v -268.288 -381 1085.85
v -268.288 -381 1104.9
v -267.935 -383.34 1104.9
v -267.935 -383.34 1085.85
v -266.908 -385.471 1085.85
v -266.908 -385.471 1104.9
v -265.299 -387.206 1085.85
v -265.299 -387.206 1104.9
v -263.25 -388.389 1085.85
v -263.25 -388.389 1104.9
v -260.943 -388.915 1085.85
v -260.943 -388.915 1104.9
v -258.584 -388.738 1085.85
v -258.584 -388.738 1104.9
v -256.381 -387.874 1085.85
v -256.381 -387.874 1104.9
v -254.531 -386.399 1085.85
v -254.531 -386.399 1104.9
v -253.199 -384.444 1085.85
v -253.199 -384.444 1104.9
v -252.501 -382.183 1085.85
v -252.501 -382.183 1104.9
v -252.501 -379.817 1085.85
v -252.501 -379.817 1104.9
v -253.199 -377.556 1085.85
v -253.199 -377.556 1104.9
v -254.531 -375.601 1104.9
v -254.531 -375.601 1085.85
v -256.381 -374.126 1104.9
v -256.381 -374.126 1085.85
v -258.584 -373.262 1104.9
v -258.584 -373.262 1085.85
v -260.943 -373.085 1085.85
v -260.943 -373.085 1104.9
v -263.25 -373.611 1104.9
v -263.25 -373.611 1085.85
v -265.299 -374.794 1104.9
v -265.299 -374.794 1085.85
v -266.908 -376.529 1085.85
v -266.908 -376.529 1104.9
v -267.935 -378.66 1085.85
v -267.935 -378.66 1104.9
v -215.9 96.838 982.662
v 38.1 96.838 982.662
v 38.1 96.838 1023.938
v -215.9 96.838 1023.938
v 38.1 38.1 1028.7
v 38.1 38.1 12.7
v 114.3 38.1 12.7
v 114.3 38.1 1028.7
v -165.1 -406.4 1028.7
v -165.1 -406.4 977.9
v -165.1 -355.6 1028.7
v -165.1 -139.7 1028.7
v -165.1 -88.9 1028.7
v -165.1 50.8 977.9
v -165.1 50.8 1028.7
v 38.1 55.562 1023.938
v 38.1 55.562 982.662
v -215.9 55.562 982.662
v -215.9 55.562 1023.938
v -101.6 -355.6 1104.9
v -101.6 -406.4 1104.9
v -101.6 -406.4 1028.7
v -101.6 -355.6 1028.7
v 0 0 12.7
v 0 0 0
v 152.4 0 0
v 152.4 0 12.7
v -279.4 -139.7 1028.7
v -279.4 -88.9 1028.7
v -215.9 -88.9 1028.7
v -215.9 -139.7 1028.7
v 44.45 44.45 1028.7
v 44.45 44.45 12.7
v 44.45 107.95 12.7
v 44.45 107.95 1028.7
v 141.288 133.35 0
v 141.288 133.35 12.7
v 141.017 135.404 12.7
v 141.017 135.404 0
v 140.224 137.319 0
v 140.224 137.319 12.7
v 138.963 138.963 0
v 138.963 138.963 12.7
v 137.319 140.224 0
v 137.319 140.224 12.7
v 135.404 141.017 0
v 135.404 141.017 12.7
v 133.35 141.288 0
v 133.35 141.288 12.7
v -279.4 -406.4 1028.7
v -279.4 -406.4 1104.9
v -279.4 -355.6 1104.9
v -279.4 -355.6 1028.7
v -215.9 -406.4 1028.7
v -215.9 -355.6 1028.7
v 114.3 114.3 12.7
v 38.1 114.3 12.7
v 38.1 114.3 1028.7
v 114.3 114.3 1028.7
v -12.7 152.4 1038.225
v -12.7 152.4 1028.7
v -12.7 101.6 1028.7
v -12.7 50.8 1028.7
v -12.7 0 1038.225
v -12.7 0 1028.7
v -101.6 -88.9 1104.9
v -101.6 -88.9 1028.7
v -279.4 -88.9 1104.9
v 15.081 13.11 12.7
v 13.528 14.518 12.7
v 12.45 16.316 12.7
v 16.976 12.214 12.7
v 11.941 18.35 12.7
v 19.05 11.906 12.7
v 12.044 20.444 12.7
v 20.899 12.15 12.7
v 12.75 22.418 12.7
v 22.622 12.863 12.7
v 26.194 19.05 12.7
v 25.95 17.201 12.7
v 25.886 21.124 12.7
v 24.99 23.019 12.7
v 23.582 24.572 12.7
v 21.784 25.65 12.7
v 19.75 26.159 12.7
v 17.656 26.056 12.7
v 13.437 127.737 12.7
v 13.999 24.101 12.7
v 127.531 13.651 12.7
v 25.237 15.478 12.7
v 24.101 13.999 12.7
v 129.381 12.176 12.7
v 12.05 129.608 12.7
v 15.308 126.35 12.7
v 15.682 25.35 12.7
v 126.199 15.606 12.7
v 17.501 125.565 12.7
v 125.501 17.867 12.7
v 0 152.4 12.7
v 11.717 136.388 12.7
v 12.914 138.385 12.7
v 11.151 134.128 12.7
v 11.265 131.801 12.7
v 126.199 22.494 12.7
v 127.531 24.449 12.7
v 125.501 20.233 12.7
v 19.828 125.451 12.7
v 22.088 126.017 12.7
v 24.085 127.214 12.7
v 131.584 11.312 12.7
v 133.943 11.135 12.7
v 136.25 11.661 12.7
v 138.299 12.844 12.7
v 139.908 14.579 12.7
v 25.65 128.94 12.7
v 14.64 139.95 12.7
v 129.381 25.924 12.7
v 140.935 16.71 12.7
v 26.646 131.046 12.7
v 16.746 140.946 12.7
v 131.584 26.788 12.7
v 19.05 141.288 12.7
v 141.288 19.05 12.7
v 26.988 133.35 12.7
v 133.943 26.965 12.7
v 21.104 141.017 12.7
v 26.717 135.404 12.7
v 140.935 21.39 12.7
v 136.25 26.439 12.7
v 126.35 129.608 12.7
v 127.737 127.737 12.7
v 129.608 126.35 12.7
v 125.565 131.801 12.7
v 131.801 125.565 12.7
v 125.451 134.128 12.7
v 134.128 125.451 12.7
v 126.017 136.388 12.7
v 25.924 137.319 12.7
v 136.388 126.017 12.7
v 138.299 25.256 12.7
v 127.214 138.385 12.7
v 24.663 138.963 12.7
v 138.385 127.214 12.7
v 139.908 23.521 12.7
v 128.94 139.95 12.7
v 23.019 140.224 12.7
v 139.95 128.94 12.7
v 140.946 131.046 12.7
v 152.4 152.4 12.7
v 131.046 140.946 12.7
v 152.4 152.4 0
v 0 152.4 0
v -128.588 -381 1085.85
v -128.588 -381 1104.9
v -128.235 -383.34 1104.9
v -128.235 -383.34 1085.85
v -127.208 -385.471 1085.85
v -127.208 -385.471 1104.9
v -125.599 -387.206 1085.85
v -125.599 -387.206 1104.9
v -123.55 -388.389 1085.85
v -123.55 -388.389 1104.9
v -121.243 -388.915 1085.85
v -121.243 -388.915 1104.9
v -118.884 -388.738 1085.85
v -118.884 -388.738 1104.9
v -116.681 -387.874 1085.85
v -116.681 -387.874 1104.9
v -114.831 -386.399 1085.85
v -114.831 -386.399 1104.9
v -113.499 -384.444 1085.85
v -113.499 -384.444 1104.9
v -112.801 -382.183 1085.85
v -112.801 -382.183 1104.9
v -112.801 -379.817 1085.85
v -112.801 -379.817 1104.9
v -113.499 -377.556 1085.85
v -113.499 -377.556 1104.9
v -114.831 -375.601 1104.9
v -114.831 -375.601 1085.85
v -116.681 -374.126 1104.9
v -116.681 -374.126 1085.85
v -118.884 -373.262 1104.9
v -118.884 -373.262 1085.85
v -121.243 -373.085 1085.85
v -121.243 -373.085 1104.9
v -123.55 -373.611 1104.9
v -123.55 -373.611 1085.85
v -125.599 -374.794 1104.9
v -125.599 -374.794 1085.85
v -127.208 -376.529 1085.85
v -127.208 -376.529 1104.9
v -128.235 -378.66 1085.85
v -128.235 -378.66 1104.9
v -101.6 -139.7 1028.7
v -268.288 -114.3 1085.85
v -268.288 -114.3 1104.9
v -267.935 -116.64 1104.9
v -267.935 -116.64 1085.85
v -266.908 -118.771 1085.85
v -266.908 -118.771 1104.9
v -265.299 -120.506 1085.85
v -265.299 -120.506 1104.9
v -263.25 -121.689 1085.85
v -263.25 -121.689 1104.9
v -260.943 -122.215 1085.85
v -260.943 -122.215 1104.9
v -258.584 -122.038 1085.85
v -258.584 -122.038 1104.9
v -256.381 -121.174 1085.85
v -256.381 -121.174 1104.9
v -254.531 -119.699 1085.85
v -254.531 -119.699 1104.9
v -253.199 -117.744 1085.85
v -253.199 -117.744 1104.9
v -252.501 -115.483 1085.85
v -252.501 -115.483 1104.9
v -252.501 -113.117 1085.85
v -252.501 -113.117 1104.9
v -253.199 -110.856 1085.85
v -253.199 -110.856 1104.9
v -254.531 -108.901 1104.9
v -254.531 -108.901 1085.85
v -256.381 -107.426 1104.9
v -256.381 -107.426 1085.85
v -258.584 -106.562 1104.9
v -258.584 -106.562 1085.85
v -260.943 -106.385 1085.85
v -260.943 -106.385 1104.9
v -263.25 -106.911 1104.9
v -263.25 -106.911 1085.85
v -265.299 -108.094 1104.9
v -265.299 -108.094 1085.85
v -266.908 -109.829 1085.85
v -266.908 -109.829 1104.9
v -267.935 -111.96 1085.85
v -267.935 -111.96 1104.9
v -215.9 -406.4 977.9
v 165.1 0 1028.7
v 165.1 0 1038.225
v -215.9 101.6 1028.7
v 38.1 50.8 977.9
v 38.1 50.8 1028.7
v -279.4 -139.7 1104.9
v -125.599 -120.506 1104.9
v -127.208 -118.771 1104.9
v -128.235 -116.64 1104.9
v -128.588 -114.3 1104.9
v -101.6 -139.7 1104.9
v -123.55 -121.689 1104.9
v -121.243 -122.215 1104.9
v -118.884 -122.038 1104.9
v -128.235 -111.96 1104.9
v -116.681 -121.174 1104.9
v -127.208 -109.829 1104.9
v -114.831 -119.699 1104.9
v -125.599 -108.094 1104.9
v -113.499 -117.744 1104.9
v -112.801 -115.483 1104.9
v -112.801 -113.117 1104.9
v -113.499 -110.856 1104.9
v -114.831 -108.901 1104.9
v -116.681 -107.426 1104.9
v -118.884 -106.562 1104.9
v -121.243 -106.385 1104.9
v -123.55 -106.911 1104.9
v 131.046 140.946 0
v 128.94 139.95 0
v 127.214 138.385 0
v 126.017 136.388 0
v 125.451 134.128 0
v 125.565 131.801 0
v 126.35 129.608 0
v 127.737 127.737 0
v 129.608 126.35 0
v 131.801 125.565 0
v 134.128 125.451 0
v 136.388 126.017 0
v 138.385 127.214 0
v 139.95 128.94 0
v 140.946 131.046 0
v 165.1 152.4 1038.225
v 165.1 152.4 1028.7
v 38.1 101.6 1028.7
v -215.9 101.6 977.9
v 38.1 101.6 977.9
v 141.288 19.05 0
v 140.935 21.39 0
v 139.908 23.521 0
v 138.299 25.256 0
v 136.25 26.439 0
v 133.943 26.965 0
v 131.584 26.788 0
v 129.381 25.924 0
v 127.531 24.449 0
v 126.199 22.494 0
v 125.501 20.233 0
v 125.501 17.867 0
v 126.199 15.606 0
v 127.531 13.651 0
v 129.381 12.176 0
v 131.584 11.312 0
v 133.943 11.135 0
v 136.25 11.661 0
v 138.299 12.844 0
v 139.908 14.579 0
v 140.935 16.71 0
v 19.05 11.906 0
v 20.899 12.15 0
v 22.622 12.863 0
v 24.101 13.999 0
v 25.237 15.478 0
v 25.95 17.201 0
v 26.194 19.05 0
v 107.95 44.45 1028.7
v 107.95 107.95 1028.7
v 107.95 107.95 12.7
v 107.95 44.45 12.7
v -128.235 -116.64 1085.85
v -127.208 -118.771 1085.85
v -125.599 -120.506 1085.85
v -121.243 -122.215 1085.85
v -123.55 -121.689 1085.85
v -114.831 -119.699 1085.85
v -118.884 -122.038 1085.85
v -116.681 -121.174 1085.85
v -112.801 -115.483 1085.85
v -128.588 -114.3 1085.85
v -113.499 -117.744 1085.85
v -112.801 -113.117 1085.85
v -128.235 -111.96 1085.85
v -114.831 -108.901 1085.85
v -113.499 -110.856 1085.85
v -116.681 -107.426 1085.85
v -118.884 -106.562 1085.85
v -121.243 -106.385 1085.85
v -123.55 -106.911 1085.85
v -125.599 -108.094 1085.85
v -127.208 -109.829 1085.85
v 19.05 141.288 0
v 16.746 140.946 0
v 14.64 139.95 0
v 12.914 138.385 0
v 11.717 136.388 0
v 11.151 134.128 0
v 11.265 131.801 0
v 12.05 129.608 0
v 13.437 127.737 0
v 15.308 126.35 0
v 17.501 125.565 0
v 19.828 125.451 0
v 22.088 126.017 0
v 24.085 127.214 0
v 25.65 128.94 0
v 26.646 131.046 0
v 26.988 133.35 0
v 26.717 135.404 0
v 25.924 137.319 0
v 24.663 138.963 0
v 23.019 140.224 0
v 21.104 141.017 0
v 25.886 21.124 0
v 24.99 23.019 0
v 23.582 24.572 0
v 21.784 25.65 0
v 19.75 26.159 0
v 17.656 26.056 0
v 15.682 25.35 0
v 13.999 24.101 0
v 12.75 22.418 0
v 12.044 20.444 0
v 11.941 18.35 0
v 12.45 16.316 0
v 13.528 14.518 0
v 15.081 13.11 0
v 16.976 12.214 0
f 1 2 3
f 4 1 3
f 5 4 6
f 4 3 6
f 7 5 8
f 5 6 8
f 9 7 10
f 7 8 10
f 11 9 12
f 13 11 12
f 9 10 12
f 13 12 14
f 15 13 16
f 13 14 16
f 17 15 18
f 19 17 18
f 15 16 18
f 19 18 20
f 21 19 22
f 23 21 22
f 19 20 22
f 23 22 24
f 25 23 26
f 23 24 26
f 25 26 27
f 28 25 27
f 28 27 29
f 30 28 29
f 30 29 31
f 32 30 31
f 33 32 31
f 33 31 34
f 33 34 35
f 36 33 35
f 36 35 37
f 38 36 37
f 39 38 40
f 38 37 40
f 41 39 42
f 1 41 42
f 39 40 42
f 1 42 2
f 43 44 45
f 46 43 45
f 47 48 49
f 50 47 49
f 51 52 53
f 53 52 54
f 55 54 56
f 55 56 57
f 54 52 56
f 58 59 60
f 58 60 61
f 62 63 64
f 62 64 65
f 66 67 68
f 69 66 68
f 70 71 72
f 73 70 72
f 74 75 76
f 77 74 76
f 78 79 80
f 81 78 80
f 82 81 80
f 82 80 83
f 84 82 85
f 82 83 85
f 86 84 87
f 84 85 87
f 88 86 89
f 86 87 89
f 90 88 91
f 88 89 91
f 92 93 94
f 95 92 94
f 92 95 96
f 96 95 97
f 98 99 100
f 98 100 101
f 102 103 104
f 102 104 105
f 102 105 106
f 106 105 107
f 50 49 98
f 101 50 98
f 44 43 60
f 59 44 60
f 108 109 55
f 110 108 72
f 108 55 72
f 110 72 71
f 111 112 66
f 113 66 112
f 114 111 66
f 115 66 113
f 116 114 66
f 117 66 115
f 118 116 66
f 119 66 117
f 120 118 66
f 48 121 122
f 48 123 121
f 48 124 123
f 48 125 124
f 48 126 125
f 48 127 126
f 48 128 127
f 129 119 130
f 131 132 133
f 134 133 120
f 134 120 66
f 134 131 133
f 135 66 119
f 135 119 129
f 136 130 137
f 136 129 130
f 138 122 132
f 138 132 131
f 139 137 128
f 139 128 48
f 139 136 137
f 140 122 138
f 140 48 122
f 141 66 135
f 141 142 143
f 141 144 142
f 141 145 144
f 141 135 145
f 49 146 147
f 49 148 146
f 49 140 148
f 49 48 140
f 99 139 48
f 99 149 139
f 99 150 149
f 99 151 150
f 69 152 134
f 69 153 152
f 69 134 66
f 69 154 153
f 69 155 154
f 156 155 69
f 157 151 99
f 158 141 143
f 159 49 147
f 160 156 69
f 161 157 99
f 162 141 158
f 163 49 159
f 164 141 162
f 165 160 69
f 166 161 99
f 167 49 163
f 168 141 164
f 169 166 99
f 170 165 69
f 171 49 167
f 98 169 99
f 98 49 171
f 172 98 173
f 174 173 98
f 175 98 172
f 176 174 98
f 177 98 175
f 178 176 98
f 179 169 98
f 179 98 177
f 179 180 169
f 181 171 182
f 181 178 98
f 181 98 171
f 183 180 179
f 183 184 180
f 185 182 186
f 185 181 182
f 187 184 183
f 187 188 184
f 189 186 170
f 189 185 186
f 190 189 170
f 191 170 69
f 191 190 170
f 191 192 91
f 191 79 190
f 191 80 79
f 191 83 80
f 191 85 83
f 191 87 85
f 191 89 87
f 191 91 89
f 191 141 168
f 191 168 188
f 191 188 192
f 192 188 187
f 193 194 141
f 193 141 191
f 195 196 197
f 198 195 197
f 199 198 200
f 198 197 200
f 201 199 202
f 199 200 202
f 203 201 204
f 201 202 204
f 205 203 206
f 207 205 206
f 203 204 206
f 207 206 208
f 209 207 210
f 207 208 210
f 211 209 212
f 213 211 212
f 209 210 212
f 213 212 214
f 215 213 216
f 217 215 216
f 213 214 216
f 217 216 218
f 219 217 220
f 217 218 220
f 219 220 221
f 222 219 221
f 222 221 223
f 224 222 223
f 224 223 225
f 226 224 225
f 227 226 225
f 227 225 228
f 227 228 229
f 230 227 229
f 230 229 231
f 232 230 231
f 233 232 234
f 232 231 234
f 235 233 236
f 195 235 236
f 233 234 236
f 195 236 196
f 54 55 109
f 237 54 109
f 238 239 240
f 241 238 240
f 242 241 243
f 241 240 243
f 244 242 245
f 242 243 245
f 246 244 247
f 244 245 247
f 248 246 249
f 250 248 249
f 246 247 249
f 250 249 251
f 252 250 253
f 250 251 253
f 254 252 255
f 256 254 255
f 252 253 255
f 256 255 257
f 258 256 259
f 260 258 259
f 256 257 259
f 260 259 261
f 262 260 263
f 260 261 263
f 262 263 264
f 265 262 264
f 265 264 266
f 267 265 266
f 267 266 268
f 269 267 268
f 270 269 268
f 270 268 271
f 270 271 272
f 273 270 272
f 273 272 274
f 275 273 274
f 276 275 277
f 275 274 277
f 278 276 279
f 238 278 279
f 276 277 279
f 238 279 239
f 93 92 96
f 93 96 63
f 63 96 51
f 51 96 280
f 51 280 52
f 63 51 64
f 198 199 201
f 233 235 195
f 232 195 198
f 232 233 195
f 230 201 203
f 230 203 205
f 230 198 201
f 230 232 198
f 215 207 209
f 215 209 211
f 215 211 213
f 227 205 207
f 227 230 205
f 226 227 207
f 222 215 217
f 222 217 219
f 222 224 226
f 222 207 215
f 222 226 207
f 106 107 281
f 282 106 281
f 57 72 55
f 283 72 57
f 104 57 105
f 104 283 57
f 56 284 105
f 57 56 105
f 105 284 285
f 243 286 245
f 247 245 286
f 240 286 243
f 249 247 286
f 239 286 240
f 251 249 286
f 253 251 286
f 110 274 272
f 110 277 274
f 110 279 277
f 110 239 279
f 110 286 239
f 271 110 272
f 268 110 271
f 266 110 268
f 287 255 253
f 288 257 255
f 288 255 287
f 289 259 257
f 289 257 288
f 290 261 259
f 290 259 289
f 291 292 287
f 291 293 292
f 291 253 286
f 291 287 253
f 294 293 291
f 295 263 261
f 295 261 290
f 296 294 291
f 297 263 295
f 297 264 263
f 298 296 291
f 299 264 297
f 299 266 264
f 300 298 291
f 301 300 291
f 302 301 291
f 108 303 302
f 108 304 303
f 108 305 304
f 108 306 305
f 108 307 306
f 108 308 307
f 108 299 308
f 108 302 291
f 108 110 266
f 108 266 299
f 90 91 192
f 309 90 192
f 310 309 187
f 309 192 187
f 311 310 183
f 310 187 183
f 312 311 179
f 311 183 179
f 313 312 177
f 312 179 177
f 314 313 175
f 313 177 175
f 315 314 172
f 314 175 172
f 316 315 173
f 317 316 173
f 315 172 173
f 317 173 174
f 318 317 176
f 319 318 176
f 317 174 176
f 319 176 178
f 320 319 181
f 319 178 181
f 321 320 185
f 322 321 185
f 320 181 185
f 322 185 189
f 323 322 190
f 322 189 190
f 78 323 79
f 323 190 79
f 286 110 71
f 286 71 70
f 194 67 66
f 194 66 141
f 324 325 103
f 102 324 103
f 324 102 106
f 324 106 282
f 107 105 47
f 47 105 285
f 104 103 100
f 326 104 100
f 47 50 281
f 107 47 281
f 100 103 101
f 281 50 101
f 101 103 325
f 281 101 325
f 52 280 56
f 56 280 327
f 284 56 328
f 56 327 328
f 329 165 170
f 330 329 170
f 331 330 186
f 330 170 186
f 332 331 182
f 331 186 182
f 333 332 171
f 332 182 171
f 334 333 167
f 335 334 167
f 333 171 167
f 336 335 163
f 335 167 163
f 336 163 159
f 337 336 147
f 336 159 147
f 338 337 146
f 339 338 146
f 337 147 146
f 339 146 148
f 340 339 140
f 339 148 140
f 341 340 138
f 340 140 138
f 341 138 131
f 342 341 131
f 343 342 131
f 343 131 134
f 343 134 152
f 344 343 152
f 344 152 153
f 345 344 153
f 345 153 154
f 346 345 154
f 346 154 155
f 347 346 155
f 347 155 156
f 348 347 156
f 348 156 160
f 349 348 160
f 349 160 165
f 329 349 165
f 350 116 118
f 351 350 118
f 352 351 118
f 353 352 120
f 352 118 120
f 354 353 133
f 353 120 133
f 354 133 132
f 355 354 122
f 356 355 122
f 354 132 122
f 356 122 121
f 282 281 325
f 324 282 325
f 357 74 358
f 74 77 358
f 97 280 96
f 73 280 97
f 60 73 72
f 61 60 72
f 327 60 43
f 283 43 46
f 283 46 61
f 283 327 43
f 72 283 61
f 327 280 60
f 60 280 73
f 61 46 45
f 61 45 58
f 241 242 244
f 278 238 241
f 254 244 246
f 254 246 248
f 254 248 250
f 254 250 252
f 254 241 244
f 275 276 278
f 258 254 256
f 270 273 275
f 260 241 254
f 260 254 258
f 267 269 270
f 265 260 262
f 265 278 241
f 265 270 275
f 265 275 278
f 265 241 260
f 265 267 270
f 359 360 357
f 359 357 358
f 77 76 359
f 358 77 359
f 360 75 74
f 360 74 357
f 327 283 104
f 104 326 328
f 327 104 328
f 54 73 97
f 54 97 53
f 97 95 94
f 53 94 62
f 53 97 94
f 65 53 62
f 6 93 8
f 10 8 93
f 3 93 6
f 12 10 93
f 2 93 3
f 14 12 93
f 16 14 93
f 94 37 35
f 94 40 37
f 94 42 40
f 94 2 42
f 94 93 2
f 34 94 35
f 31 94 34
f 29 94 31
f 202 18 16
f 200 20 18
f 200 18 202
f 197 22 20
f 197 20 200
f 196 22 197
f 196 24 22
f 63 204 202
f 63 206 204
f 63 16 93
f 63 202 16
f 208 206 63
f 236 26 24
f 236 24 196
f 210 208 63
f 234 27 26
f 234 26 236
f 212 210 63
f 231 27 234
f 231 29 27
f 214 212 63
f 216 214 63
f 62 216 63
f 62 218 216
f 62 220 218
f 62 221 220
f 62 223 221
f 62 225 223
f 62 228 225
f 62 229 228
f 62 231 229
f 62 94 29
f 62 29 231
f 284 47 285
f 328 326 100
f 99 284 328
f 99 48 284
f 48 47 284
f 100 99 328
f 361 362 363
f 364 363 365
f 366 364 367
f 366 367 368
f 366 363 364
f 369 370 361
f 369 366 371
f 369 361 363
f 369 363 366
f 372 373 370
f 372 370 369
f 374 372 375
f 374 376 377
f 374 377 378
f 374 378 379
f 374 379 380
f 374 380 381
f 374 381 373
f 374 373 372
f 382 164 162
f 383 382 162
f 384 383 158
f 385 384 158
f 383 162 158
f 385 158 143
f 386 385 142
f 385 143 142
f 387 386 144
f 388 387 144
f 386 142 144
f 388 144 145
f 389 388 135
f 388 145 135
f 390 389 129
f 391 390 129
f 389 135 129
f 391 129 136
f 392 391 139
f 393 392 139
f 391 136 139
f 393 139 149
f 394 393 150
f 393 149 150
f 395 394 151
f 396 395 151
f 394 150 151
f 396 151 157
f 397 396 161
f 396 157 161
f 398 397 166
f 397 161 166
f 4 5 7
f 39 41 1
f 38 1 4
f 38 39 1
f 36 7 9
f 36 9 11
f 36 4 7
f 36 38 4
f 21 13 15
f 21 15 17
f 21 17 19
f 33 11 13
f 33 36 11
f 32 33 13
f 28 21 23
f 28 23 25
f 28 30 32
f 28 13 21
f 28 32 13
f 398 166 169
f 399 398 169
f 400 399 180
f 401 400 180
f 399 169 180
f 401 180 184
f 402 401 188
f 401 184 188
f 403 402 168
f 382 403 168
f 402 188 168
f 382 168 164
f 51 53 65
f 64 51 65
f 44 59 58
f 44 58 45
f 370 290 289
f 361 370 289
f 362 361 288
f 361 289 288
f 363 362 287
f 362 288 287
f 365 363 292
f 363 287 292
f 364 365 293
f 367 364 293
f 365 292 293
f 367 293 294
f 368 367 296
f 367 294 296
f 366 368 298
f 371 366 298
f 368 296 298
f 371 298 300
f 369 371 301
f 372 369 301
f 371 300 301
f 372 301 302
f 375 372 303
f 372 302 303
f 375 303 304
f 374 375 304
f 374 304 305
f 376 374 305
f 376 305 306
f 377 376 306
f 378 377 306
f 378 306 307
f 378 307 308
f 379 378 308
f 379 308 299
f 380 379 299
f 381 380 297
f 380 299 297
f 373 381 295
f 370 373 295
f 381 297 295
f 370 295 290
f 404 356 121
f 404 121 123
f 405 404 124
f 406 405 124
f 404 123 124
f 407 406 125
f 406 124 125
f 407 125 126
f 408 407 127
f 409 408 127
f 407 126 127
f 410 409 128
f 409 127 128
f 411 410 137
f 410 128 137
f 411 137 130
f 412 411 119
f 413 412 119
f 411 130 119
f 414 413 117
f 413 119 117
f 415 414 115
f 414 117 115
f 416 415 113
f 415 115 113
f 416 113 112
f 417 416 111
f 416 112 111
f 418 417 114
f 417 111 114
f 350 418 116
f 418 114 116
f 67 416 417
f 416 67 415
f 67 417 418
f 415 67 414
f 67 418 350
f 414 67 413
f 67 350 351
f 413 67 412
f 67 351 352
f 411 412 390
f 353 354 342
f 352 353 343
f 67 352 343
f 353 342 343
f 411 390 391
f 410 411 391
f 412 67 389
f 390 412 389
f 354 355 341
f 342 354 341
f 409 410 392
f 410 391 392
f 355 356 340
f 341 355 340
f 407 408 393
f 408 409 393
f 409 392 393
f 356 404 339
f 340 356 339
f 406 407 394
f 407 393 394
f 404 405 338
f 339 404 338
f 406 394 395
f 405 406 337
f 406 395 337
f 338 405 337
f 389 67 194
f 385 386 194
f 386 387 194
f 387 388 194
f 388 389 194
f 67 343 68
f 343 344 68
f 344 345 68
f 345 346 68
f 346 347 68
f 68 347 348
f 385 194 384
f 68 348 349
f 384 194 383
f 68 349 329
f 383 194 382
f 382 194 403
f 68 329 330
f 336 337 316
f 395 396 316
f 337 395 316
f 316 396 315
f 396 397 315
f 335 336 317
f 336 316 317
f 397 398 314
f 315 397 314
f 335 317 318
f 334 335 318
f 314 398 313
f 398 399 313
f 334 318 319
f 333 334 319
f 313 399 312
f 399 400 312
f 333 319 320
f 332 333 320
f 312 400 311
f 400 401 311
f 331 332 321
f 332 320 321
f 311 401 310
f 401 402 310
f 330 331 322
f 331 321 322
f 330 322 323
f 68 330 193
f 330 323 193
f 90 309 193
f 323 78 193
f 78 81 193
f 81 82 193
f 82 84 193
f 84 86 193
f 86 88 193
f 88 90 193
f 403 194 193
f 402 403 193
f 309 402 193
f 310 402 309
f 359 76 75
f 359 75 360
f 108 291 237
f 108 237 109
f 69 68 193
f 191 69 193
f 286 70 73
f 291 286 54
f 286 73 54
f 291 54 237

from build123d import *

# Parameters (mm, degrees)
F0_W      = 152.4
F0_H      = 152.4
F1_DEPTH  = 12.7
F2_W      = 76.2
F2_H      = 76.2
F2_W_2    = 63.5
F2_H_2    = 63.5
F3_DEPTH  = 1016
F4_W      = 41.275
F4_H      = 41.275
F5_DEPTH  = 254
F6_W      = 50.8
F6_H      = 50.8
F7_DEPTH  = 457.2
F8_W      = 177.8
F8_H      = 50.8
F9_DEPTH  = 76.2
F11_DEPTH = 9.525
F13_DEPTH = 19.05
F15_DEPTH = 19.05
F16_R     = 7.9375
F17_DEPTH = 25.4


with BuildPart() as f1:
    # F0 (on Top) → F1 (new body)
    with BuildSketch(Plane.XY):
        with Locations((76.2, 76.2)):
            Rectangle(F0_W, F0_H)
    extrude(amount=F1_DEPTH)

    # F2 (on face) → F3 (join)
    with BuildSketch(Plane.XY.offset(12.7)):
        with Locations((76.2, 76.2)):
            Rectangle(F2_W, F2_H)
        with Locations((76.2, 76.2)):
            Rectangle(F2_W_2, F2_H_2, mode=Mode.SUBTRACT)
    extrude(amount=F3_DEPTH)

    # F4 (on face) → F5 (join)
    with BuildSketch(Plane(origin=(38.1, 0, 0), x_dir=(0, -1, 0), z_dir=(-1, 0, 0))):
        Polygon((-50.8, 1028.7), (-101.6, 1028.7), (-101.6, 1023.9375), (-101.6, 977.9), (-50.8, 977.9), align=None)
        with Locations((-76.2, 1003.3)):
            Rectangle(F4_W, F4_H, mode=Mode.SUBTRACT)
    extrude(amount=F5_DEPTH)

    # F6 (on face) → F7 (join)
    with BuildSketch(Plane.XZ.offset(-50.8)):
        with Locations((-190.5, 1003.3)):
            Rectangle(F6_W, F6_H)
    extrude(amount=F7_DEPTH)

    # F8 (on face) → F9 (join)
    with BuildSketch(Plane.XY.offset(1028.7)):
        with Locations((-190.5, -381)):
            Rectangle(F8_W, F8_H)
        Polygon((-101.6, -88.9), (-165.1, -88.9), (-279.4, -88.9), (-279.4, -139.7), (-101.6, -139.7), align=None)
    extrude(amount=F9_DEPTH)

    # F10 (on face) → F11 (join)
    with BuildSketch(Plane.XY.offset(1028.7)):
        Polygon((165.1, 152.4), (114.3, 152.4), (-12.7, 152.4), (-12.7, 0), (165.1, 0), align=None)
    extrude(amount=F11_DEPTH)

    # F12 (on face) → F13 (cut)
    with BuildSketch(Plane.XY.offset(1104.9)):
        with BuildLine():
            Line((-268.2875, -114.3), (-260.35, -114.3))
            Line((-260.35, -114.3), (-252.4125, -114.3))
            ThreePointArc((-252.4125, -114.3), (-260.35, -106.3625), (-268.2875, -114.3))
        make_face()
        with BuildLine():
            Line((-252.4125, -114.3), (-260.35, -114.3))
            Line((-260.35, -114.3), (-268.2875, -114.3))
            ThreePointArc((-268.2875, -114.3), (-260.35, -122.2375), (-252.4125, -114.3))
        make_face()
        with BuildLine():
            ThreePointArc((-112.7125, -114.3), (-120.65, -106.3625), (-128.5875, -114.3))
            Line((-128.5875, -114.3), (-120.65, -114.3))
            Line((-120.65, -114.3), (-112.7125, -114.3))
        make_face()
        with BuildLine():
            Line((-120.65, -114.3), (-128.5875, -114.3))
            ThreePointArc((-128.5875, -114.3), (-120.65, -122.2375), (-112.7125, -114.3))
            Line((-112.7125, -114.3), (-120.65, -114.3))
        make_face()
    extrude(amount=-F13_DEPTH, mode=Mode.SUBTRACT)

    # F14 (on face) → F15 (cut)
    with BuildSketch(Plane.XY.offset(1104.9)):
        with BuildLine():
            Line((-268.2875, -381), (-260.35, -381))
            Line((-260.35, -381), (-252.4125, -381))
            ThreePointArc((-252.4125, -381), (-260.35, -373.0625), (-268.2875, -381))
        make_face()
        with BuildLine():
            Line((-252.4125, -381), (-260.35, -381))
            Line((-260.35, -381), (-268.2875, -381))
            ThreePointArc((-268.2875, -381), (-260.35, -388.9375), (-252.4125, -381))
        make_face()
        with BuildLine():
            ThreePointArc((-112.7125, -381), (-120.65, -373.0625), (-128.5875, -381))
            Line((-128.5875, -381), (-120.65, -381))
            Line((-120.65, -381), (-112.7125, -381))
        make_face()
        with BuildLine():
            Line((-120.65, -381), (-128.5875, -381))
            ThreePointArc((-128.5875, -381), (-120.65, -388.9375), (-112.7125, -381))
            Line((-112.7125, -381), (-120.65, -381))
        make_face()
    extrude(amount=-F15_DEPTH, mode=Mode.SUBTRACT)

    # F16 (on face) → F17 (cut)
    with BuildSketch(Plane.XY.offset(12.7)):
        with BuildLine():
            ThreePointArc((19.05, 11.90625), (24.101394, 13.998606), (26.19375, 19.05))
            ThreePointArc((26.19375, 19.05), (13.998606, 24.101394), (19.05, 11.90625))
        make_face()
        with BuildLine():
            ThreePointArc((133.35, 141.2875), (127.73734, 127.73734), (141.2875, 133.35))
            ThreePointArc((141.2875, 133.35), (138.96266, 138.96266), (133.35, 141.2875))
        make_face()
        with Locations((133.35, 19.05)):
            Circle(F16_R)
        with BuildLine():
            ThreePointArc((19.05, 141.2875), (13.43734, 127.73734), (26.9875, 133.35))
            ThreePointArc((26.9875, 133.35), (24.66266, 138.96266), (19.05, 141.2875))
        make_face()
    extrude(amount=-F17_DEPTH, mode=Mode.SUBTRACT)


solid = f1.part
